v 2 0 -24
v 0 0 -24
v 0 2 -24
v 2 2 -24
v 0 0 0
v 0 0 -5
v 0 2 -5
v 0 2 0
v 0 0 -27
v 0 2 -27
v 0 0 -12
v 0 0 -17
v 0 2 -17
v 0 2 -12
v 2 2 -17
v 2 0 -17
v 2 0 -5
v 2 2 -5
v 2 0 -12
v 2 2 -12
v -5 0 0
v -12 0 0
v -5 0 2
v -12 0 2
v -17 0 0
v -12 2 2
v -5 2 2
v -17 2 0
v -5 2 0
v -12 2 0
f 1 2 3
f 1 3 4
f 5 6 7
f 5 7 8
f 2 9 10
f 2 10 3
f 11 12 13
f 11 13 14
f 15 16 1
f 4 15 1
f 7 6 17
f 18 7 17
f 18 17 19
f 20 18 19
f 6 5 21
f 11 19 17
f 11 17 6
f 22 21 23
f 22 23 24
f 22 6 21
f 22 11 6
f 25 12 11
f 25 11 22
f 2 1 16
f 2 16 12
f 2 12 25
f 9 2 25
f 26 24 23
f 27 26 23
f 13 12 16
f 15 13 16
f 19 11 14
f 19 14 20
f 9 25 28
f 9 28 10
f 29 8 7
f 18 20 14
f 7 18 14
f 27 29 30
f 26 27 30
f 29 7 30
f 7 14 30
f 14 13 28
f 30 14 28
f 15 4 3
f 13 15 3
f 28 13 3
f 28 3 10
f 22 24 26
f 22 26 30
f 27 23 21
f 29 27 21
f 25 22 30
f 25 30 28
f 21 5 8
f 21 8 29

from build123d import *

# Parameters (mm, degrees)
SKETCH1_W           = 7
SKETCH1_H           = 2
SKETCH1_W_2         = 2
SKETCH1_H_2         = 7
BOSS_EXTRUDE1_DEPTH = 2


with BuildPart() as part:
    # Sketch1 → Boss-Extrude1 (new body)
    with BuildSketch(Plane(origin=(0, 0, 0), x_dir=(1, 0, 0), z_dir=(0, 1, 0))):
        Polygon((0, 27), (0, 0), (-17, 0), align=None)
        with Locations((-8.5, -1)):
            Rectangle(SKETCH1_W, SKETCH1_H)
        with Locations((1, 8.5)):
            Rectangle(SKETCH1_W_2, SKETCH1_H_2)
        with Locations((1, 20.5)):
            Rectangle(SKETCH1_W_2, SKETCH1_H_2)
    extrude(amount=BOSS_EXTRUDE1_DEPTH)


solid = part.part
